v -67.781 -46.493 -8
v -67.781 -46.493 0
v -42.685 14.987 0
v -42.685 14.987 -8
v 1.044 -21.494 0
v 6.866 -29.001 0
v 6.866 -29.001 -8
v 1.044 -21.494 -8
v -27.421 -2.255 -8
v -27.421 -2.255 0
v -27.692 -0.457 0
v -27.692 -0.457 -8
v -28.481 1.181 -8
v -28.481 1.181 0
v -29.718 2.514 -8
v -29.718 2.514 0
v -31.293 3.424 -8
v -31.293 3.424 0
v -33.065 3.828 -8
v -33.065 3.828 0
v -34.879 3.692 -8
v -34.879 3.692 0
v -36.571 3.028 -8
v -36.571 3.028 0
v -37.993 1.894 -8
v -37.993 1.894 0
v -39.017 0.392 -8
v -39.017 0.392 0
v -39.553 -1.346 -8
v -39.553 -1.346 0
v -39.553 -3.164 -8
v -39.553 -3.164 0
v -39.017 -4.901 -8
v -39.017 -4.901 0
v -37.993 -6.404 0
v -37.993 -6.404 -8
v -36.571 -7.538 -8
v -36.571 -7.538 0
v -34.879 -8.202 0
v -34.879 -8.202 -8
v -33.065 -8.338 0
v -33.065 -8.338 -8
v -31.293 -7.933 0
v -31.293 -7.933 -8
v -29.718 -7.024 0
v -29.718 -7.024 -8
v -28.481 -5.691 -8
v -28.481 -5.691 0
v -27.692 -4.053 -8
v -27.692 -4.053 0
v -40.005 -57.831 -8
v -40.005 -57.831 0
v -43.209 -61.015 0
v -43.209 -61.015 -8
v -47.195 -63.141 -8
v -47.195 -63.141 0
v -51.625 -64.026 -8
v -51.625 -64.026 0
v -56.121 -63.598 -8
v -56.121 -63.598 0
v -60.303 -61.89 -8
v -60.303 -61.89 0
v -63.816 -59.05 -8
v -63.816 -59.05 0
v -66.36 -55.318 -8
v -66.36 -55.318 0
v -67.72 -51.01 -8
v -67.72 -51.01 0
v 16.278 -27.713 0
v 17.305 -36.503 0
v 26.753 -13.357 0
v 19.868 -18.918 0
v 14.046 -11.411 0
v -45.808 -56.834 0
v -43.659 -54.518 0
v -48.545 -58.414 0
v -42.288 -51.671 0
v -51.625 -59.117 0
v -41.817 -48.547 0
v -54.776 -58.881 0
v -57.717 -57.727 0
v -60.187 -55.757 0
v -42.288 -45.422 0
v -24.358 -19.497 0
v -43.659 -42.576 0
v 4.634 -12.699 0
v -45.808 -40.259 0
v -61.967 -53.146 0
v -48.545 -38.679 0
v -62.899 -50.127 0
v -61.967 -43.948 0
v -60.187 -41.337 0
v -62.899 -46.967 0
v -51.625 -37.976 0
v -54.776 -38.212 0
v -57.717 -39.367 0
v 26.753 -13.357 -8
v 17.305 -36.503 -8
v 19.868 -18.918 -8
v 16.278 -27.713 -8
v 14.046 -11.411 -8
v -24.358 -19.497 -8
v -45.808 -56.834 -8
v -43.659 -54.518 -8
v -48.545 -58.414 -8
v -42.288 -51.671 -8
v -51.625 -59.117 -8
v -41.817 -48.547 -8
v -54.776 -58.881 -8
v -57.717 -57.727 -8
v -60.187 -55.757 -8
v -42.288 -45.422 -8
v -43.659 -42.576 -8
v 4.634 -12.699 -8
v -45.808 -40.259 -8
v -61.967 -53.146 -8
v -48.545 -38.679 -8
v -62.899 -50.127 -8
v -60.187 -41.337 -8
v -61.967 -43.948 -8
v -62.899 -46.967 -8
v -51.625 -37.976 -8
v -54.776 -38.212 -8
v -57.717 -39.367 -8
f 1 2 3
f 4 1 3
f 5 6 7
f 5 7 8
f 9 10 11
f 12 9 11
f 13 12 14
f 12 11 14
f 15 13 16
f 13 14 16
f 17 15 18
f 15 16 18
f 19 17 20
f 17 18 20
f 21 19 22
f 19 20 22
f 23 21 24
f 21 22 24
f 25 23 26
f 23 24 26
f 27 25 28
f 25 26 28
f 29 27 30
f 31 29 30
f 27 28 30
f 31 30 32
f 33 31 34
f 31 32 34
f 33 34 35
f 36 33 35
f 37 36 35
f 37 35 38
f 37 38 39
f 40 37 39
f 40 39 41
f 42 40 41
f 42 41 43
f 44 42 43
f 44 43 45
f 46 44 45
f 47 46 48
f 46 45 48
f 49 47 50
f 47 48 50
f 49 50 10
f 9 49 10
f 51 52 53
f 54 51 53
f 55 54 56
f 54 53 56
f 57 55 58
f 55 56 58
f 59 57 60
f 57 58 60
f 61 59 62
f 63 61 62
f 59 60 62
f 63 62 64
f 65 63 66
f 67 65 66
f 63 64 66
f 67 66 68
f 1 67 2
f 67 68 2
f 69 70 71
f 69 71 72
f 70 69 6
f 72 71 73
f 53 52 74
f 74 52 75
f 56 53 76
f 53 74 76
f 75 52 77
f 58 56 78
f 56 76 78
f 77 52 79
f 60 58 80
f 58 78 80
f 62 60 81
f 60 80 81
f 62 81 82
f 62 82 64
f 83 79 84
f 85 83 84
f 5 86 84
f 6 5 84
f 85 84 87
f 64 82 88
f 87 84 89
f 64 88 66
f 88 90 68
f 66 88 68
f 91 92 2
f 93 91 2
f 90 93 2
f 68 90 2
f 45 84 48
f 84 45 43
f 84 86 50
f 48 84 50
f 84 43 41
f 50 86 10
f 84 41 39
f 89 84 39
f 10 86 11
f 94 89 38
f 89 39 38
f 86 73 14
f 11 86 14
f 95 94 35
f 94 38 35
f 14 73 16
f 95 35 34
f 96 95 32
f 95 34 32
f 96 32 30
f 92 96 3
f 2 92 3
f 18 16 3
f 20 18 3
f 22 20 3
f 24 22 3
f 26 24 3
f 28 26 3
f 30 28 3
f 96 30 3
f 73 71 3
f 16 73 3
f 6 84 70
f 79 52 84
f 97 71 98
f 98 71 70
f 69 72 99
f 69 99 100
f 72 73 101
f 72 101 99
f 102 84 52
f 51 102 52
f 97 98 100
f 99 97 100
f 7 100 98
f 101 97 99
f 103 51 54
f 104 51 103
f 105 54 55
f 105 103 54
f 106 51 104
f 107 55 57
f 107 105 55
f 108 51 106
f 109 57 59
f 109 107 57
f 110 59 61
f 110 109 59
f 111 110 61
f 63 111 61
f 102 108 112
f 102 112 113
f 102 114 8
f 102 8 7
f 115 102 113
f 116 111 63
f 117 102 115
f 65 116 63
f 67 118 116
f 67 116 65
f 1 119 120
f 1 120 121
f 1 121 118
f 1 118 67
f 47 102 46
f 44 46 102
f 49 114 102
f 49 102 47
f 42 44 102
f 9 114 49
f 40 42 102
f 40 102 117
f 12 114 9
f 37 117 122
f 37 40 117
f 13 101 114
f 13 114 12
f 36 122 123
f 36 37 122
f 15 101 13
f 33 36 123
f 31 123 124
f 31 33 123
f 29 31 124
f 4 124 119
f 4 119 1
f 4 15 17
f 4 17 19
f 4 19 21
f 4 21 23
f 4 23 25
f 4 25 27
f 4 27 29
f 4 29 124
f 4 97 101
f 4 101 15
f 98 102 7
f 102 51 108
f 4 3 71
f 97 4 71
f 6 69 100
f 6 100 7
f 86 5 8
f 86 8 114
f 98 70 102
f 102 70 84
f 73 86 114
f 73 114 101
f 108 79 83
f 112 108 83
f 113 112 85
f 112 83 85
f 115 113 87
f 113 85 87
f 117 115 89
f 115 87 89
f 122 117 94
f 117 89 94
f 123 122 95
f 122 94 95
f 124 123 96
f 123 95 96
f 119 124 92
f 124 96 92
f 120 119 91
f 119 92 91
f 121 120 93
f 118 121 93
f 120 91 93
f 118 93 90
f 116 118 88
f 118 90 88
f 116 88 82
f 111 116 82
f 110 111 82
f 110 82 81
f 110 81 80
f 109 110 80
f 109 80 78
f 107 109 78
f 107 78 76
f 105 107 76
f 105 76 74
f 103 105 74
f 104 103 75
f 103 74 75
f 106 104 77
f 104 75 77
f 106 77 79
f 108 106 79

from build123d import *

# Parameters (mm, degrees)
SKETCH_1_R      = 6.1
SKETCH_1_R_2    = 10.6
EXTRUDE_1_DEPTH = 8


with BuildPart() as part:
    # 草圖1 → 填料-伸長1 (new body)
    with BuildSketch(Plane.XY):
        with BuildLine():
            Line((-42.684704159, 14.986968014), (26.753169389, -13.357021069))
            Line((26.753169389, -13.357021069), (17.305173028, -36.502978918))
            Line((17.305173028, -36.502978918), (-24.357551101, -19.496585468))
            Line((-24.357551101, -19.496585468), (-40.005369853, -57.831036438))
            ThreePointArc((-40.005369853, -57.831036438), (-58.274878096, -62.897218292), (-67.780519272, -46.493440805))
            Line((-67.780519272, -46.493440805), (-42.684704159, 14.986968014))
        make_face()
        with Locations((-33.52112763, -2.254808727)):
            Circle(SKETCH_1_R, mode=Mode.SUBTRACT)
        with Locations((-52.417120352, -48.546724426)):
            Circle(SKETCH_1_R_2, mode=Mode.SUBTRACT)
        Polygon((1.043977728, -21.494495956), (4.634216345, -12.699031974), (14.046430901, -11.41053783), (19.868406839, -18.91750767), (16.278168222, -27.712971653), (6.865953666, -29.001465796), align=None, mode=Mode.SUBTRACT)
    extrude(amount=-EXTRUDE_1_DEPTH)


solid = part.part
